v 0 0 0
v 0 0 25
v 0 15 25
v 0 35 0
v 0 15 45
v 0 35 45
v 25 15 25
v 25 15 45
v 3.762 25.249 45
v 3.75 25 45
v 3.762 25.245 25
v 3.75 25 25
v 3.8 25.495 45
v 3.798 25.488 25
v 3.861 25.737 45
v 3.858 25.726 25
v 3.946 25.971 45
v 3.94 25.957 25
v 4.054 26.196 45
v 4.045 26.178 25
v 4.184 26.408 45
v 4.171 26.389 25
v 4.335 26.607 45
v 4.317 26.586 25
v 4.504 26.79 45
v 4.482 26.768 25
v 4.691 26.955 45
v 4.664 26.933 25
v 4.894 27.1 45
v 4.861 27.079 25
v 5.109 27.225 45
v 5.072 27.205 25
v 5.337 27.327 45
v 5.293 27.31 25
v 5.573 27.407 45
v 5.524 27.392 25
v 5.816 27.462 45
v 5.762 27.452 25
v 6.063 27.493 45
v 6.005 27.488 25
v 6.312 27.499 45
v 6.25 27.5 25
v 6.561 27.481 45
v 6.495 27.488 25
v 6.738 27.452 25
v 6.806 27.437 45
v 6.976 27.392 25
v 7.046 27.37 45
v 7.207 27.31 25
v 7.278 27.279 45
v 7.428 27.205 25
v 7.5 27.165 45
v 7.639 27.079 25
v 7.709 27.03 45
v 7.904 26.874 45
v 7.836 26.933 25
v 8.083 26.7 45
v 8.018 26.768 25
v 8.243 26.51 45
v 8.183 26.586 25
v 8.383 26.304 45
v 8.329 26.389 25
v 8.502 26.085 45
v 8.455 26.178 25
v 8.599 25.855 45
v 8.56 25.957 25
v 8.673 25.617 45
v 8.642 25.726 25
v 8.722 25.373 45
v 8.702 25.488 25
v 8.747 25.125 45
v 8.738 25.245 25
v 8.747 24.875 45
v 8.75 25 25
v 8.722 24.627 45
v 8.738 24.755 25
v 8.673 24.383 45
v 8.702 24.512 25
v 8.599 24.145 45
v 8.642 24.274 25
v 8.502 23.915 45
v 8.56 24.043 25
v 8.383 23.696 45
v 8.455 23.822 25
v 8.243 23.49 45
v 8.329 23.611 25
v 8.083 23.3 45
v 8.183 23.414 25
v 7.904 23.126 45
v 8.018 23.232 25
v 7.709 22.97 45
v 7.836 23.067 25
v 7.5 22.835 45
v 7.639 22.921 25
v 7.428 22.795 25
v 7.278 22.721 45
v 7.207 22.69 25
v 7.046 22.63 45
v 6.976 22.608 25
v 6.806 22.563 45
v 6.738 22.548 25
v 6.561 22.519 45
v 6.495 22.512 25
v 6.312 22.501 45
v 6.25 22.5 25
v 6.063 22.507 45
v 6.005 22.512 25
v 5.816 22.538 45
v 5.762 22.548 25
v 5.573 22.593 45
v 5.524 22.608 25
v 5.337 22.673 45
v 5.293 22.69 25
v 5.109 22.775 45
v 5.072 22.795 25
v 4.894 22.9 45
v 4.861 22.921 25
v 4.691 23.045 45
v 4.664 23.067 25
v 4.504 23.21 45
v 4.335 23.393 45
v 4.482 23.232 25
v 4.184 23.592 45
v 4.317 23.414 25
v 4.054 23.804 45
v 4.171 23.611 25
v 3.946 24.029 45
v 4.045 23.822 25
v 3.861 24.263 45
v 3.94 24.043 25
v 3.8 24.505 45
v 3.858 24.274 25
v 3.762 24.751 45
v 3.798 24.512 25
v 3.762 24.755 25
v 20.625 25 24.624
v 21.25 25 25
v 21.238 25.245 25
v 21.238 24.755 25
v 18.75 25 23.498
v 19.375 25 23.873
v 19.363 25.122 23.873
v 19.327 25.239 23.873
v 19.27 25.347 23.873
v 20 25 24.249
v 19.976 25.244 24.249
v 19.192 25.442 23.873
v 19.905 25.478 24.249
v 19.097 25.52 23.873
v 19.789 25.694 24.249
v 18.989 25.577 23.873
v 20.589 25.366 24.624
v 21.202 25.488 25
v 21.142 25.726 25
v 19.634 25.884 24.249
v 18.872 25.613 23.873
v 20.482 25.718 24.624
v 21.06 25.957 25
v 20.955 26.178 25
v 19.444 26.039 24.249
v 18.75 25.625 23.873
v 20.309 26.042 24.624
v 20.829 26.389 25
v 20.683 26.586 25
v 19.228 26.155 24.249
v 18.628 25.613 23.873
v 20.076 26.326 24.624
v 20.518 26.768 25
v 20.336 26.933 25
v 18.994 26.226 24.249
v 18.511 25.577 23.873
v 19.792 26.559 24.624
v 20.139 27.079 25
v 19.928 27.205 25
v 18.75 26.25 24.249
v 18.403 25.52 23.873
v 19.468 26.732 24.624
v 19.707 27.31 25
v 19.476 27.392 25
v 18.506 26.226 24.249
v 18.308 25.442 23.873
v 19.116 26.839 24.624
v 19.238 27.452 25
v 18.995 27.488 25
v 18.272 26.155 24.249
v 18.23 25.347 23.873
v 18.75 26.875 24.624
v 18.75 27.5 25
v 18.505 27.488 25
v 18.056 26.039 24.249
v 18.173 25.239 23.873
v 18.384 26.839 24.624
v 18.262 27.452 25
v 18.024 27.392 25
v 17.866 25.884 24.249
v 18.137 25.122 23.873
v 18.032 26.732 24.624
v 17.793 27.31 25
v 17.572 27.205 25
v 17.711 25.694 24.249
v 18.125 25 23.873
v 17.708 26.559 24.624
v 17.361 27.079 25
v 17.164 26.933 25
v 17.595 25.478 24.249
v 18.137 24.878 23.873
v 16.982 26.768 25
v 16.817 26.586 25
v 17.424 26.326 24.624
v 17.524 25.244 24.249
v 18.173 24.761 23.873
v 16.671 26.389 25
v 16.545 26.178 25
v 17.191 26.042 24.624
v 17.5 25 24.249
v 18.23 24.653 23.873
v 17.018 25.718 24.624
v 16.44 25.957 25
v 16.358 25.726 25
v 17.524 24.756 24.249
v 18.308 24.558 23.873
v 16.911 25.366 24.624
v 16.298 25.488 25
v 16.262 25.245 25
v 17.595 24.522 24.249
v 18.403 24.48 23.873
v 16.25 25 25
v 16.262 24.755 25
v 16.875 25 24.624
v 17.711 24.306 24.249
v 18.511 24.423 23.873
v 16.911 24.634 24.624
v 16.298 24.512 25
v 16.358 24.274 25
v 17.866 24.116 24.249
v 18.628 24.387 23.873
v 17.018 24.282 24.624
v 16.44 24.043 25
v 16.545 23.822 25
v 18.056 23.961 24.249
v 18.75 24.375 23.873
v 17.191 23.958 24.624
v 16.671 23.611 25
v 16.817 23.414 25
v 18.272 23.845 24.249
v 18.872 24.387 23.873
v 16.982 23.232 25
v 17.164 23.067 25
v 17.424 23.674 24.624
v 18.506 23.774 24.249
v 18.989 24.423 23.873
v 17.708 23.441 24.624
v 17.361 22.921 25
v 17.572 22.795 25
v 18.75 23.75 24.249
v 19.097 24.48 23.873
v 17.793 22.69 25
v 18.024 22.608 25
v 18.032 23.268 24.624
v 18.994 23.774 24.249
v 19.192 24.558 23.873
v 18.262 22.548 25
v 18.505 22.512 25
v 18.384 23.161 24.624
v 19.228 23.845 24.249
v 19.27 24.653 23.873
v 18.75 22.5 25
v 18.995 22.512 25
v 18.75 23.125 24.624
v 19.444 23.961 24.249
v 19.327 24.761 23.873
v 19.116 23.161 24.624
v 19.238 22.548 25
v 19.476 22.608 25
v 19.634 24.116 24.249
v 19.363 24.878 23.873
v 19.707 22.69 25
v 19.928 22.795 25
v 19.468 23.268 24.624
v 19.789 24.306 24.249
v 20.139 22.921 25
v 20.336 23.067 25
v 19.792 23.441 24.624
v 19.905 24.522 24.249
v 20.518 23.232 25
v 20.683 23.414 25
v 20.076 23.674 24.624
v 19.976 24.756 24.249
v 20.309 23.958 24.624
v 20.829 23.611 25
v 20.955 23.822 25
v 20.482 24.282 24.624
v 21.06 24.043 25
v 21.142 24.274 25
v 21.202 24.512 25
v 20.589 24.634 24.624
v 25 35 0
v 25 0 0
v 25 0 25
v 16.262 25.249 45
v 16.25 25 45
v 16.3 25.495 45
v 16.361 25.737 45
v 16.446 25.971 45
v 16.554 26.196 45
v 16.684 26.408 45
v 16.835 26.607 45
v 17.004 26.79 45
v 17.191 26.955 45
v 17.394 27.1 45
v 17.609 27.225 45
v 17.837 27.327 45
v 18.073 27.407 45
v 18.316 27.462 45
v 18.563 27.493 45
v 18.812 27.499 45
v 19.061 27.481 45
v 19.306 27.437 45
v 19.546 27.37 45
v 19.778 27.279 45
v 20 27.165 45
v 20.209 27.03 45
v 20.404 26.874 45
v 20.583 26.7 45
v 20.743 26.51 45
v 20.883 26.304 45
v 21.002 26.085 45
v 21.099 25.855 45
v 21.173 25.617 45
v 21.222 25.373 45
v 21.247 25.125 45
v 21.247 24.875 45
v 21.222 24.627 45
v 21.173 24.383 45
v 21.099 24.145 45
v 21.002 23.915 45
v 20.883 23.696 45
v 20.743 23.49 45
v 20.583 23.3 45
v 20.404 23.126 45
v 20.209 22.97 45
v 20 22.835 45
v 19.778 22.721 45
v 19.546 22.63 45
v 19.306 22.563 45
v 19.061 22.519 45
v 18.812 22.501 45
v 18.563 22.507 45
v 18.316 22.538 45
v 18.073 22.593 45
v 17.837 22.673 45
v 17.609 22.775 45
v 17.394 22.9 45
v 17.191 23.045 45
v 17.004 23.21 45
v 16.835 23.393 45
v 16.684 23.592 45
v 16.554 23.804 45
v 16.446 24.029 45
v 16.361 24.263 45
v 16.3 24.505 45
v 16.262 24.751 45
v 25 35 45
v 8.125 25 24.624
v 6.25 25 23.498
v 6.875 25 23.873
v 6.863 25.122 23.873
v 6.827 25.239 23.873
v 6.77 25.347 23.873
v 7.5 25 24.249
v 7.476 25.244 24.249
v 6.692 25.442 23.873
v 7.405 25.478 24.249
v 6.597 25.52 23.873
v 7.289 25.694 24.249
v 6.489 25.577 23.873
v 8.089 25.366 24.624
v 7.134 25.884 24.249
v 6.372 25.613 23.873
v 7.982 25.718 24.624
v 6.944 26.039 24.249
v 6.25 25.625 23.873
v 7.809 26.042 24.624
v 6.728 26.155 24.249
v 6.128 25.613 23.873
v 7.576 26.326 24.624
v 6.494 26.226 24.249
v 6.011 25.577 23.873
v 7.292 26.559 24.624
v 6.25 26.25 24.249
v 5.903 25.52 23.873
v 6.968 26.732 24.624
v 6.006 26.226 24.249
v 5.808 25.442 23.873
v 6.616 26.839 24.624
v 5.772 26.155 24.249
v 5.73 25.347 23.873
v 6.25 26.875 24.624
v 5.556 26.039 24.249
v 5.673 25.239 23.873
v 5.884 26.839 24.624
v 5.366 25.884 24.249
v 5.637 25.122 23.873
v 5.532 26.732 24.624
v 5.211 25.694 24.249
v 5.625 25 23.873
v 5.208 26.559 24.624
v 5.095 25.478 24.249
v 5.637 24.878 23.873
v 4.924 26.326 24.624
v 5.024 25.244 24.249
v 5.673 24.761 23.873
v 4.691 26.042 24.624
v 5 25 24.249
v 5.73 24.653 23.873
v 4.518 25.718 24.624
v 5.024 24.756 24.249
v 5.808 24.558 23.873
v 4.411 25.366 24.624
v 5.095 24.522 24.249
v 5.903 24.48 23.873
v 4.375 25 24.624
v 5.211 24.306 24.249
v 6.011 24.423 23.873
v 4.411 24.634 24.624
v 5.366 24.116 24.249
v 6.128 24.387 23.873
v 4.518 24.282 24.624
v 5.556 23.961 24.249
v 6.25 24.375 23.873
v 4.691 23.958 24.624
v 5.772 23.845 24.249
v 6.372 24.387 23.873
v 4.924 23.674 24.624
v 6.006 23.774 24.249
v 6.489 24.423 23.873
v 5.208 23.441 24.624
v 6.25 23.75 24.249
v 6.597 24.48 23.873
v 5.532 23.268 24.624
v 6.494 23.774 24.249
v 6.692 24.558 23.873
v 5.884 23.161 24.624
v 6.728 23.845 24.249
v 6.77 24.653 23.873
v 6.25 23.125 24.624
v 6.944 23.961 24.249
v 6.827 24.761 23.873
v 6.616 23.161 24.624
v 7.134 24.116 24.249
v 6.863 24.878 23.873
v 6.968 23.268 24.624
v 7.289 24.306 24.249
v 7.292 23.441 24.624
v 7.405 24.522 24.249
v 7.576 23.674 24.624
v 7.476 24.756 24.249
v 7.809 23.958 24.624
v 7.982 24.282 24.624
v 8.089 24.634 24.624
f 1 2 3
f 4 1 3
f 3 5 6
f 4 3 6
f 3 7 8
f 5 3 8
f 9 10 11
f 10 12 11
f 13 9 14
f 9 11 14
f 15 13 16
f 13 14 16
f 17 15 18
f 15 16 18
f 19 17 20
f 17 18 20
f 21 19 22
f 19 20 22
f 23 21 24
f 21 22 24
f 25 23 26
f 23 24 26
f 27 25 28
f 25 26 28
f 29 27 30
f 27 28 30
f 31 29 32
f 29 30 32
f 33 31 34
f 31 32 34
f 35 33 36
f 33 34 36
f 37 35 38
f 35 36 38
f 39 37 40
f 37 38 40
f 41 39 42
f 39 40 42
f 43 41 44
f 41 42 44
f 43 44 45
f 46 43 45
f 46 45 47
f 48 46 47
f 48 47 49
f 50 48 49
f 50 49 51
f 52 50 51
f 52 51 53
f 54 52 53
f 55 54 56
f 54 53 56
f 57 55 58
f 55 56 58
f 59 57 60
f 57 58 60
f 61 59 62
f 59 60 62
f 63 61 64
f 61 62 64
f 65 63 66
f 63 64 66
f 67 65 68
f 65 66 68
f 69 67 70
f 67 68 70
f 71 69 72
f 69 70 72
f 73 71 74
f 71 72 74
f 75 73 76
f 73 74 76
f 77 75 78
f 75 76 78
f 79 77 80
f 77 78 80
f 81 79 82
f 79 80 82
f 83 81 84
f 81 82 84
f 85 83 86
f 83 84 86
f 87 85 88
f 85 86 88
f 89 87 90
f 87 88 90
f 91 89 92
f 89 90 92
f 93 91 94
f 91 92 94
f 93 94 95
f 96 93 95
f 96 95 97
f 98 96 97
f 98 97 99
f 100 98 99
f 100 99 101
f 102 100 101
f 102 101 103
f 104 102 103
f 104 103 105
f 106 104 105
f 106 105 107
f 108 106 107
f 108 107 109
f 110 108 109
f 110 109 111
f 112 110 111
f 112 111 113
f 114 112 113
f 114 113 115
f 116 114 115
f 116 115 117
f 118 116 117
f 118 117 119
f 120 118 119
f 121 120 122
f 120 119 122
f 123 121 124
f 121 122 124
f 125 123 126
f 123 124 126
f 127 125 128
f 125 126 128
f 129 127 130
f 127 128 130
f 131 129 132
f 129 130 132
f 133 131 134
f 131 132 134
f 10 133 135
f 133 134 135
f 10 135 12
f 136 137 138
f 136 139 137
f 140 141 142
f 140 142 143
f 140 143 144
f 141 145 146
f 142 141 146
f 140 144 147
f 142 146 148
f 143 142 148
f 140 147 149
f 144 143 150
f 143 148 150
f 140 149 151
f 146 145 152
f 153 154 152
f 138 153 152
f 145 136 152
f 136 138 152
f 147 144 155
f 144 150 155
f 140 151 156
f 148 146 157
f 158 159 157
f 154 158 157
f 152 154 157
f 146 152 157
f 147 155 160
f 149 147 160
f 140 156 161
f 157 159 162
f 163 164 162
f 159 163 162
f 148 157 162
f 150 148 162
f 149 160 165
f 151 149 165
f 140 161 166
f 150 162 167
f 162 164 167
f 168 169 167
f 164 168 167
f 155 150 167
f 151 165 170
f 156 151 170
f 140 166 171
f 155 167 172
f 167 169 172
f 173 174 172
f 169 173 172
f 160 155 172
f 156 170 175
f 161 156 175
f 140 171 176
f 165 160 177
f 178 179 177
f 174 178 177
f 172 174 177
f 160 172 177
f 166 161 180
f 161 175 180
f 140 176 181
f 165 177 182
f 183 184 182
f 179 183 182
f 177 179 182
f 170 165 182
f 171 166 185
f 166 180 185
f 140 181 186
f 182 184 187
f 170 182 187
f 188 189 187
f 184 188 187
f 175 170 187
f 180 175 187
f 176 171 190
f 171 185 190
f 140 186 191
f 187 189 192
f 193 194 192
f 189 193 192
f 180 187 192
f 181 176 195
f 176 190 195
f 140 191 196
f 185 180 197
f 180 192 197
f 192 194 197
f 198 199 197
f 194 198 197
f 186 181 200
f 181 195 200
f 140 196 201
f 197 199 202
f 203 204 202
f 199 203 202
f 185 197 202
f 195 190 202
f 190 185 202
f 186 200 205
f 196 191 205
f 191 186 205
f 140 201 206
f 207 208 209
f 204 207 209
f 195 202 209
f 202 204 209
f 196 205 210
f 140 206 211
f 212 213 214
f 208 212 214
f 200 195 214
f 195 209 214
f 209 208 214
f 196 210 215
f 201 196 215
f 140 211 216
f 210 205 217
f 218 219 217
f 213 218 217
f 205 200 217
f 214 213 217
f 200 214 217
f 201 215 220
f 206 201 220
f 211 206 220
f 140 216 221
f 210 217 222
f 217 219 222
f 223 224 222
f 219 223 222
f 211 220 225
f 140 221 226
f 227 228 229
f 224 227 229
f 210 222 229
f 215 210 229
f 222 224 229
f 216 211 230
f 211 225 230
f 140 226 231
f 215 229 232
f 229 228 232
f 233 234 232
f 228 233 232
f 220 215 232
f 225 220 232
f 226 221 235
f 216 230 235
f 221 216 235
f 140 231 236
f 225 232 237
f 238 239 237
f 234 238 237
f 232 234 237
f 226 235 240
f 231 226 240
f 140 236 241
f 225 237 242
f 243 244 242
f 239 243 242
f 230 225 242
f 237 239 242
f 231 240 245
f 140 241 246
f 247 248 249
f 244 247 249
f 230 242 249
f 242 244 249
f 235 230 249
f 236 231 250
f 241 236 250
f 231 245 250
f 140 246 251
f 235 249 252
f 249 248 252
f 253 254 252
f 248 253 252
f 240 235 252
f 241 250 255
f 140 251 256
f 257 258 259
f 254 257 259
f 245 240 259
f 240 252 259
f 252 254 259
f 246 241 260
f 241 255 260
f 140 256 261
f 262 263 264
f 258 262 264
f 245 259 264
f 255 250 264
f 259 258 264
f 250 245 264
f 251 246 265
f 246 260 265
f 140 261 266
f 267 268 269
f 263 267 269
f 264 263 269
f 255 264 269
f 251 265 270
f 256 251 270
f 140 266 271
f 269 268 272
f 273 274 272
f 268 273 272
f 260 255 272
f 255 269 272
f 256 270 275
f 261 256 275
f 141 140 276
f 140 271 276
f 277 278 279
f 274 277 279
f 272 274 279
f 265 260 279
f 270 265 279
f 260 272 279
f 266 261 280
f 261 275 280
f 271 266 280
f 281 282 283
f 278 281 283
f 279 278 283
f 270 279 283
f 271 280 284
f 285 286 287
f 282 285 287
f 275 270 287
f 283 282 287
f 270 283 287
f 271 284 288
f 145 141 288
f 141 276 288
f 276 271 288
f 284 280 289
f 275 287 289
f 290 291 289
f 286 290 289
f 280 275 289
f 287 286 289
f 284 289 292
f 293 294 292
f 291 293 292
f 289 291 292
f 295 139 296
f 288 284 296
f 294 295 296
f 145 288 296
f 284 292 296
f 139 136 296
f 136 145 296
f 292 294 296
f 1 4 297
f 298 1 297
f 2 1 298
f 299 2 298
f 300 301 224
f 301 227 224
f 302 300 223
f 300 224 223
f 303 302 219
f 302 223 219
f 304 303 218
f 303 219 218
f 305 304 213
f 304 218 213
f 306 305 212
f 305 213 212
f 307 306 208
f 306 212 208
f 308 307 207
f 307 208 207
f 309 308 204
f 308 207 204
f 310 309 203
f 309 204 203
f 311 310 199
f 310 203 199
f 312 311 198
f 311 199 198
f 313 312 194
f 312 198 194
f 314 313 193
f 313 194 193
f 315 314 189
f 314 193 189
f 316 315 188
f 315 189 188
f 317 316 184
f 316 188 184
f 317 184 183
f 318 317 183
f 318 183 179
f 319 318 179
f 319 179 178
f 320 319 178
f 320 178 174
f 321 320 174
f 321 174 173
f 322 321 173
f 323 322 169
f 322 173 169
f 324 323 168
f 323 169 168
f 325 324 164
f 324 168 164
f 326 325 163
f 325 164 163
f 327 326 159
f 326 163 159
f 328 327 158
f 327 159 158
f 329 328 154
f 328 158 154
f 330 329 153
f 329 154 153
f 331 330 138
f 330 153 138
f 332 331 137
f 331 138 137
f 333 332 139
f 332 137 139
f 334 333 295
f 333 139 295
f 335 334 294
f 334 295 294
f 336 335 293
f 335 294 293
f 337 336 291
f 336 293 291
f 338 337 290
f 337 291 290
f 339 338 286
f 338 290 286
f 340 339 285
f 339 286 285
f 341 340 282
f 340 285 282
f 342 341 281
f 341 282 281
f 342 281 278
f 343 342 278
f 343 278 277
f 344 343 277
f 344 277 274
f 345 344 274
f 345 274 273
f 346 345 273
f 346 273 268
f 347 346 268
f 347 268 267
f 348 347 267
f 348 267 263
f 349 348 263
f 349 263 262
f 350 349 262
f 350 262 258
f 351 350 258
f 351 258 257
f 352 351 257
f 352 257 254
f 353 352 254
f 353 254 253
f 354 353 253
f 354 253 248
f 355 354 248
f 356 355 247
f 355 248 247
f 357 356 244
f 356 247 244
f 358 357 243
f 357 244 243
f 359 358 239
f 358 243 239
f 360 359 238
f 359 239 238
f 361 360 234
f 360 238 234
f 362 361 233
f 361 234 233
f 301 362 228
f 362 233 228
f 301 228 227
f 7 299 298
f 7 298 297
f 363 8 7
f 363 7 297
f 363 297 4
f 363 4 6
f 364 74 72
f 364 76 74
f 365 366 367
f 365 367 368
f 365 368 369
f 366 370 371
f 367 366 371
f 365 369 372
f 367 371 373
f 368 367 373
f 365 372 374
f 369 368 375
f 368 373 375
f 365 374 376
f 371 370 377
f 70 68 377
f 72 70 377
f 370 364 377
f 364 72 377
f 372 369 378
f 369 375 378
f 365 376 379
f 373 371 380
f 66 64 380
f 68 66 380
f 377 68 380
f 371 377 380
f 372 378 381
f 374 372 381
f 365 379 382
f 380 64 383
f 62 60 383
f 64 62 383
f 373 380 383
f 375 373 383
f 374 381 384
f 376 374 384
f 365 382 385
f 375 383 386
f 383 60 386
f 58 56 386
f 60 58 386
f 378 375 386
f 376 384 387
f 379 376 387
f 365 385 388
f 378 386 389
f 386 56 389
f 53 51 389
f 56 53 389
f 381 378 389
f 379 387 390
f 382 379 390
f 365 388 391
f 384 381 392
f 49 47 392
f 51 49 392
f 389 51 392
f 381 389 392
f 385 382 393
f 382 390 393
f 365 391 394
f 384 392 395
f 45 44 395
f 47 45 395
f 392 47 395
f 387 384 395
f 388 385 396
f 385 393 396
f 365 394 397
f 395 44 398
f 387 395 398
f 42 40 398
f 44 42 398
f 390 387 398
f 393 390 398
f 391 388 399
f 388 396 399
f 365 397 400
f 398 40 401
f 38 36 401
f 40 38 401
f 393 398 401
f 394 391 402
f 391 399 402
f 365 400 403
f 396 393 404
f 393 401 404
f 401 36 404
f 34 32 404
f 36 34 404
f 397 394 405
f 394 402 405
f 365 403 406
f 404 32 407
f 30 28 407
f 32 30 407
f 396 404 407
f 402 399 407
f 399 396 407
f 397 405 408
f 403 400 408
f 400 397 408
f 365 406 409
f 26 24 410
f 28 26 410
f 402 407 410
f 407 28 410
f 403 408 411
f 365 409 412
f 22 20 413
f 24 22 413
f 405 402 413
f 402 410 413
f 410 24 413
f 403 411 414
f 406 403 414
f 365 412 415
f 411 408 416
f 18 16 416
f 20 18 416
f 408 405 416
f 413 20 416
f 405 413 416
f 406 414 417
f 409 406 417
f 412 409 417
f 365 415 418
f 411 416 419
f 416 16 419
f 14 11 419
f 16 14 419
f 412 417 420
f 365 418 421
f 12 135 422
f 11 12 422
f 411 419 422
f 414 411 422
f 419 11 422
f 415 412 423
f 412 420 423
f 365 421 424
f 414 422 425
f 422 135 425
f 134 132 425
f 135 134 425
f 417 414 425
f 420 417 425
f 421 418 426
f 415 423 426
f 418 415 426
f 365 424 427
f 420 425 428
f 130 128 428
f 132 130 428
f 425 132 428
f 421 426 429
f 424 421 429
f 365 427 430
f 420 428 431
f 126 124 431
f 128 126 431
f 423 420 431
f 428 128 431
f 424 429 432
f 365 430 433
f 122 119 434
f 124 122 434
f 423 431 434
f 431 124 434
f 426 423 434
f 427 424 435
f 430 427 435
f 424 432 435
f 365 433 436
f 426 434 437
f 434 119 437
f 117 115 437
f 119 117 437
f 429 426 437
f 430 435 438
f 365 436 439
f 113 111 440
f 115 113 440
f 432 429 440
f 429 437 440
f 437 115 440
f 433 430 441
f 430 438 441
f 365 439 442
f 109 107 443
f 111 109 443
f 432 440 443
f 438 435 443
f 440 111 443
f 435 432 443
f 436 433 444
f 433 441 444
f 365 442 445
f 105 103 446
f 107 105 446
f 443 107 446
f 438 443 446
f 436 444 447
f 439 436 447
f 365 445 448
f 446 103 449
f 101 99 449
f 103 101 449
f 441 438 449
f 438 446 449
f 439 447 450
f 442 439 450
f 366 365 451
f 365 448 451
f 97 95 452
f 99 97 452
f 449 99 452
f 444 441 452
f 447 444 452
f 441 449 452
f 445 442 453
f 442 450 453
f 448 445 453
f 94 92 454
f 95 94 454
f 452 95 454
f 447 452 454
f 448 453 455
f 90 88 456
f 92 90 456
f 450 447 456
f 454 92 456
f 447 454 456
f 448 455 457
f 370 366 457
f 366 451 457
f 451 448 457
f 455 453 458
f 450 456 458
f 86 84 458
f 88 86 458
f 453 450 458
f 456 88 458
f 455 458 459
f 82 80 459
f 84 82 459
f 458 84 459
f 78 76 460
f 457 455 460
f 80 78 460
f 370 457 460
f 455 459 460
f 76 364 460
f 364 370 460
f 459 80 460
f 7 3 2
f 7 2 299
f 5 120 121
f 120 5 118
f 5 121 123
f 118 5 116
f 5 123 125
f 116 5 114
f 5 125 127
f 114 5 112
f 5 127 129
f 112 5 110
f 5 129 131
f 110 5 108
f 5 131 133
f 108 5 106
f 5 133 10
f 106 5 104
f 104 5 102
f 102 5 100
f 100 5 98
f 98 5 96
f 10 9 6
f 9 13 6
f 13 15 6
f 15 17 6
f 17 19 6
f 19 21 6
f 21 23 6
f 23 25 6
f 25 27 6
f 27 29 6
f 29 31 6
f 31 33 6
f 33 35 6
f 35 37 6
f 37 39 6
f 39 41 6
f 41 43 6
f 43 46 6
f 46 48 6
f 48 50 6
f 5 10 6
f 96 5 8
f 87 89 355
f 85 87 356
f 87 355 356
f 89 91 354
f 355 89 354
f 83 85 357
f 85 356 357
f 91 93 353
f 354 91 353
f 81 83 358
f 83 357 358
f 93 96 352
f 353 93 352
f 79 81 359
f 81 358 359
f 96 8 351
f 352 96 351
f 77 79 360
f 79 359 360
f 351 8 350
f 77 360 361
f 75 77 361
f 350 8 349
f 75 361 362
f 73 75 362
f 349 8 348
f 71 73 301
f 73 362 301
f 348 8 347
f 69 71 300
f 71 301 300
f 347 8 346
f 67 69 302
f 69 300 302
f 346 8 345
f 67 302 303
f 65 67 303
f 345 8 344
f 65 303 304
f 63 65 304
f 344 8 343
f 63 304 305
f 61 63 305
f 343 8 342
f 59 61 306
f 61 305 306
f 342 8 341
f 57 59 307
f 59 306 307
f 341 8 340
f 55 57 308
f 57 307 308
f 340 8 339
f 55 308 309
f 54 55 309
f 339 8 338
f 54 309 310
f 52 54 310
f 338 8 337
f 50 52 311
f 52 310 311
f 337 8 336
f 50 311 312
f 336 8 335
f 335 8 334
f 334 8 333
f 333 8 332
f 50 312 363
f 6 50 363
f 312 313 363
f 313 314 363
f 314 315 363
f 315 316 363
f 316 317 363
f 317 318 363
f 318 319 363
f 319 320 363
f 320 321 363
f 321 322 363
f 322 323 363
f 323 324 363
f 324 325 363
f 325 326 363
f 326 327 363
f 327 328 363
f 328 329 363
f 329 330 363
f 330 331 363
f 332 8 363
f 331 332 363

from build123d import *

# Parameters (mm, degrees)
F0_W     = 25
F0_H     = 35
F1_DEPTH = 25
F2_W     = 20
F2_H     = 20
F3_DEPTH = 25
F5_D     = 5
F5_DEPTH = 20
F5_TIP   = 1.5021515476


with BuildPart() as f1:
    # F0 (on Top) → F1 (new body)
    with BuildSketch(Plane.XY):
        with Locations((12.5, 17.5)):
            Rectangle(F0_W, F0_H)
    extrude(amount=F1_DEPTH)

    # F2 (on face) → F3 (join)
    with BuildSketch(Plane.YZ.offset(25)):
        with Locations((25, 35)):
            Rectangle(F2_W, F2_H)
    extrude(amount=-F3_DEPTH)

    # F5
    with Locations(Plane.XY.offset(45)):
        with Locations((6.25, 25), (18.75, 25)):
            Hole(F5_D / 2, depth=F5_DEPTH)
            with Locations((0, 0, -(F5_DEPTH + F5_TIP / 2))):  # 118° drill point
                Cone(0, F5_D / 2, F5_TIP, mode=Mode.SUBTRACT)


solid = f1.part
